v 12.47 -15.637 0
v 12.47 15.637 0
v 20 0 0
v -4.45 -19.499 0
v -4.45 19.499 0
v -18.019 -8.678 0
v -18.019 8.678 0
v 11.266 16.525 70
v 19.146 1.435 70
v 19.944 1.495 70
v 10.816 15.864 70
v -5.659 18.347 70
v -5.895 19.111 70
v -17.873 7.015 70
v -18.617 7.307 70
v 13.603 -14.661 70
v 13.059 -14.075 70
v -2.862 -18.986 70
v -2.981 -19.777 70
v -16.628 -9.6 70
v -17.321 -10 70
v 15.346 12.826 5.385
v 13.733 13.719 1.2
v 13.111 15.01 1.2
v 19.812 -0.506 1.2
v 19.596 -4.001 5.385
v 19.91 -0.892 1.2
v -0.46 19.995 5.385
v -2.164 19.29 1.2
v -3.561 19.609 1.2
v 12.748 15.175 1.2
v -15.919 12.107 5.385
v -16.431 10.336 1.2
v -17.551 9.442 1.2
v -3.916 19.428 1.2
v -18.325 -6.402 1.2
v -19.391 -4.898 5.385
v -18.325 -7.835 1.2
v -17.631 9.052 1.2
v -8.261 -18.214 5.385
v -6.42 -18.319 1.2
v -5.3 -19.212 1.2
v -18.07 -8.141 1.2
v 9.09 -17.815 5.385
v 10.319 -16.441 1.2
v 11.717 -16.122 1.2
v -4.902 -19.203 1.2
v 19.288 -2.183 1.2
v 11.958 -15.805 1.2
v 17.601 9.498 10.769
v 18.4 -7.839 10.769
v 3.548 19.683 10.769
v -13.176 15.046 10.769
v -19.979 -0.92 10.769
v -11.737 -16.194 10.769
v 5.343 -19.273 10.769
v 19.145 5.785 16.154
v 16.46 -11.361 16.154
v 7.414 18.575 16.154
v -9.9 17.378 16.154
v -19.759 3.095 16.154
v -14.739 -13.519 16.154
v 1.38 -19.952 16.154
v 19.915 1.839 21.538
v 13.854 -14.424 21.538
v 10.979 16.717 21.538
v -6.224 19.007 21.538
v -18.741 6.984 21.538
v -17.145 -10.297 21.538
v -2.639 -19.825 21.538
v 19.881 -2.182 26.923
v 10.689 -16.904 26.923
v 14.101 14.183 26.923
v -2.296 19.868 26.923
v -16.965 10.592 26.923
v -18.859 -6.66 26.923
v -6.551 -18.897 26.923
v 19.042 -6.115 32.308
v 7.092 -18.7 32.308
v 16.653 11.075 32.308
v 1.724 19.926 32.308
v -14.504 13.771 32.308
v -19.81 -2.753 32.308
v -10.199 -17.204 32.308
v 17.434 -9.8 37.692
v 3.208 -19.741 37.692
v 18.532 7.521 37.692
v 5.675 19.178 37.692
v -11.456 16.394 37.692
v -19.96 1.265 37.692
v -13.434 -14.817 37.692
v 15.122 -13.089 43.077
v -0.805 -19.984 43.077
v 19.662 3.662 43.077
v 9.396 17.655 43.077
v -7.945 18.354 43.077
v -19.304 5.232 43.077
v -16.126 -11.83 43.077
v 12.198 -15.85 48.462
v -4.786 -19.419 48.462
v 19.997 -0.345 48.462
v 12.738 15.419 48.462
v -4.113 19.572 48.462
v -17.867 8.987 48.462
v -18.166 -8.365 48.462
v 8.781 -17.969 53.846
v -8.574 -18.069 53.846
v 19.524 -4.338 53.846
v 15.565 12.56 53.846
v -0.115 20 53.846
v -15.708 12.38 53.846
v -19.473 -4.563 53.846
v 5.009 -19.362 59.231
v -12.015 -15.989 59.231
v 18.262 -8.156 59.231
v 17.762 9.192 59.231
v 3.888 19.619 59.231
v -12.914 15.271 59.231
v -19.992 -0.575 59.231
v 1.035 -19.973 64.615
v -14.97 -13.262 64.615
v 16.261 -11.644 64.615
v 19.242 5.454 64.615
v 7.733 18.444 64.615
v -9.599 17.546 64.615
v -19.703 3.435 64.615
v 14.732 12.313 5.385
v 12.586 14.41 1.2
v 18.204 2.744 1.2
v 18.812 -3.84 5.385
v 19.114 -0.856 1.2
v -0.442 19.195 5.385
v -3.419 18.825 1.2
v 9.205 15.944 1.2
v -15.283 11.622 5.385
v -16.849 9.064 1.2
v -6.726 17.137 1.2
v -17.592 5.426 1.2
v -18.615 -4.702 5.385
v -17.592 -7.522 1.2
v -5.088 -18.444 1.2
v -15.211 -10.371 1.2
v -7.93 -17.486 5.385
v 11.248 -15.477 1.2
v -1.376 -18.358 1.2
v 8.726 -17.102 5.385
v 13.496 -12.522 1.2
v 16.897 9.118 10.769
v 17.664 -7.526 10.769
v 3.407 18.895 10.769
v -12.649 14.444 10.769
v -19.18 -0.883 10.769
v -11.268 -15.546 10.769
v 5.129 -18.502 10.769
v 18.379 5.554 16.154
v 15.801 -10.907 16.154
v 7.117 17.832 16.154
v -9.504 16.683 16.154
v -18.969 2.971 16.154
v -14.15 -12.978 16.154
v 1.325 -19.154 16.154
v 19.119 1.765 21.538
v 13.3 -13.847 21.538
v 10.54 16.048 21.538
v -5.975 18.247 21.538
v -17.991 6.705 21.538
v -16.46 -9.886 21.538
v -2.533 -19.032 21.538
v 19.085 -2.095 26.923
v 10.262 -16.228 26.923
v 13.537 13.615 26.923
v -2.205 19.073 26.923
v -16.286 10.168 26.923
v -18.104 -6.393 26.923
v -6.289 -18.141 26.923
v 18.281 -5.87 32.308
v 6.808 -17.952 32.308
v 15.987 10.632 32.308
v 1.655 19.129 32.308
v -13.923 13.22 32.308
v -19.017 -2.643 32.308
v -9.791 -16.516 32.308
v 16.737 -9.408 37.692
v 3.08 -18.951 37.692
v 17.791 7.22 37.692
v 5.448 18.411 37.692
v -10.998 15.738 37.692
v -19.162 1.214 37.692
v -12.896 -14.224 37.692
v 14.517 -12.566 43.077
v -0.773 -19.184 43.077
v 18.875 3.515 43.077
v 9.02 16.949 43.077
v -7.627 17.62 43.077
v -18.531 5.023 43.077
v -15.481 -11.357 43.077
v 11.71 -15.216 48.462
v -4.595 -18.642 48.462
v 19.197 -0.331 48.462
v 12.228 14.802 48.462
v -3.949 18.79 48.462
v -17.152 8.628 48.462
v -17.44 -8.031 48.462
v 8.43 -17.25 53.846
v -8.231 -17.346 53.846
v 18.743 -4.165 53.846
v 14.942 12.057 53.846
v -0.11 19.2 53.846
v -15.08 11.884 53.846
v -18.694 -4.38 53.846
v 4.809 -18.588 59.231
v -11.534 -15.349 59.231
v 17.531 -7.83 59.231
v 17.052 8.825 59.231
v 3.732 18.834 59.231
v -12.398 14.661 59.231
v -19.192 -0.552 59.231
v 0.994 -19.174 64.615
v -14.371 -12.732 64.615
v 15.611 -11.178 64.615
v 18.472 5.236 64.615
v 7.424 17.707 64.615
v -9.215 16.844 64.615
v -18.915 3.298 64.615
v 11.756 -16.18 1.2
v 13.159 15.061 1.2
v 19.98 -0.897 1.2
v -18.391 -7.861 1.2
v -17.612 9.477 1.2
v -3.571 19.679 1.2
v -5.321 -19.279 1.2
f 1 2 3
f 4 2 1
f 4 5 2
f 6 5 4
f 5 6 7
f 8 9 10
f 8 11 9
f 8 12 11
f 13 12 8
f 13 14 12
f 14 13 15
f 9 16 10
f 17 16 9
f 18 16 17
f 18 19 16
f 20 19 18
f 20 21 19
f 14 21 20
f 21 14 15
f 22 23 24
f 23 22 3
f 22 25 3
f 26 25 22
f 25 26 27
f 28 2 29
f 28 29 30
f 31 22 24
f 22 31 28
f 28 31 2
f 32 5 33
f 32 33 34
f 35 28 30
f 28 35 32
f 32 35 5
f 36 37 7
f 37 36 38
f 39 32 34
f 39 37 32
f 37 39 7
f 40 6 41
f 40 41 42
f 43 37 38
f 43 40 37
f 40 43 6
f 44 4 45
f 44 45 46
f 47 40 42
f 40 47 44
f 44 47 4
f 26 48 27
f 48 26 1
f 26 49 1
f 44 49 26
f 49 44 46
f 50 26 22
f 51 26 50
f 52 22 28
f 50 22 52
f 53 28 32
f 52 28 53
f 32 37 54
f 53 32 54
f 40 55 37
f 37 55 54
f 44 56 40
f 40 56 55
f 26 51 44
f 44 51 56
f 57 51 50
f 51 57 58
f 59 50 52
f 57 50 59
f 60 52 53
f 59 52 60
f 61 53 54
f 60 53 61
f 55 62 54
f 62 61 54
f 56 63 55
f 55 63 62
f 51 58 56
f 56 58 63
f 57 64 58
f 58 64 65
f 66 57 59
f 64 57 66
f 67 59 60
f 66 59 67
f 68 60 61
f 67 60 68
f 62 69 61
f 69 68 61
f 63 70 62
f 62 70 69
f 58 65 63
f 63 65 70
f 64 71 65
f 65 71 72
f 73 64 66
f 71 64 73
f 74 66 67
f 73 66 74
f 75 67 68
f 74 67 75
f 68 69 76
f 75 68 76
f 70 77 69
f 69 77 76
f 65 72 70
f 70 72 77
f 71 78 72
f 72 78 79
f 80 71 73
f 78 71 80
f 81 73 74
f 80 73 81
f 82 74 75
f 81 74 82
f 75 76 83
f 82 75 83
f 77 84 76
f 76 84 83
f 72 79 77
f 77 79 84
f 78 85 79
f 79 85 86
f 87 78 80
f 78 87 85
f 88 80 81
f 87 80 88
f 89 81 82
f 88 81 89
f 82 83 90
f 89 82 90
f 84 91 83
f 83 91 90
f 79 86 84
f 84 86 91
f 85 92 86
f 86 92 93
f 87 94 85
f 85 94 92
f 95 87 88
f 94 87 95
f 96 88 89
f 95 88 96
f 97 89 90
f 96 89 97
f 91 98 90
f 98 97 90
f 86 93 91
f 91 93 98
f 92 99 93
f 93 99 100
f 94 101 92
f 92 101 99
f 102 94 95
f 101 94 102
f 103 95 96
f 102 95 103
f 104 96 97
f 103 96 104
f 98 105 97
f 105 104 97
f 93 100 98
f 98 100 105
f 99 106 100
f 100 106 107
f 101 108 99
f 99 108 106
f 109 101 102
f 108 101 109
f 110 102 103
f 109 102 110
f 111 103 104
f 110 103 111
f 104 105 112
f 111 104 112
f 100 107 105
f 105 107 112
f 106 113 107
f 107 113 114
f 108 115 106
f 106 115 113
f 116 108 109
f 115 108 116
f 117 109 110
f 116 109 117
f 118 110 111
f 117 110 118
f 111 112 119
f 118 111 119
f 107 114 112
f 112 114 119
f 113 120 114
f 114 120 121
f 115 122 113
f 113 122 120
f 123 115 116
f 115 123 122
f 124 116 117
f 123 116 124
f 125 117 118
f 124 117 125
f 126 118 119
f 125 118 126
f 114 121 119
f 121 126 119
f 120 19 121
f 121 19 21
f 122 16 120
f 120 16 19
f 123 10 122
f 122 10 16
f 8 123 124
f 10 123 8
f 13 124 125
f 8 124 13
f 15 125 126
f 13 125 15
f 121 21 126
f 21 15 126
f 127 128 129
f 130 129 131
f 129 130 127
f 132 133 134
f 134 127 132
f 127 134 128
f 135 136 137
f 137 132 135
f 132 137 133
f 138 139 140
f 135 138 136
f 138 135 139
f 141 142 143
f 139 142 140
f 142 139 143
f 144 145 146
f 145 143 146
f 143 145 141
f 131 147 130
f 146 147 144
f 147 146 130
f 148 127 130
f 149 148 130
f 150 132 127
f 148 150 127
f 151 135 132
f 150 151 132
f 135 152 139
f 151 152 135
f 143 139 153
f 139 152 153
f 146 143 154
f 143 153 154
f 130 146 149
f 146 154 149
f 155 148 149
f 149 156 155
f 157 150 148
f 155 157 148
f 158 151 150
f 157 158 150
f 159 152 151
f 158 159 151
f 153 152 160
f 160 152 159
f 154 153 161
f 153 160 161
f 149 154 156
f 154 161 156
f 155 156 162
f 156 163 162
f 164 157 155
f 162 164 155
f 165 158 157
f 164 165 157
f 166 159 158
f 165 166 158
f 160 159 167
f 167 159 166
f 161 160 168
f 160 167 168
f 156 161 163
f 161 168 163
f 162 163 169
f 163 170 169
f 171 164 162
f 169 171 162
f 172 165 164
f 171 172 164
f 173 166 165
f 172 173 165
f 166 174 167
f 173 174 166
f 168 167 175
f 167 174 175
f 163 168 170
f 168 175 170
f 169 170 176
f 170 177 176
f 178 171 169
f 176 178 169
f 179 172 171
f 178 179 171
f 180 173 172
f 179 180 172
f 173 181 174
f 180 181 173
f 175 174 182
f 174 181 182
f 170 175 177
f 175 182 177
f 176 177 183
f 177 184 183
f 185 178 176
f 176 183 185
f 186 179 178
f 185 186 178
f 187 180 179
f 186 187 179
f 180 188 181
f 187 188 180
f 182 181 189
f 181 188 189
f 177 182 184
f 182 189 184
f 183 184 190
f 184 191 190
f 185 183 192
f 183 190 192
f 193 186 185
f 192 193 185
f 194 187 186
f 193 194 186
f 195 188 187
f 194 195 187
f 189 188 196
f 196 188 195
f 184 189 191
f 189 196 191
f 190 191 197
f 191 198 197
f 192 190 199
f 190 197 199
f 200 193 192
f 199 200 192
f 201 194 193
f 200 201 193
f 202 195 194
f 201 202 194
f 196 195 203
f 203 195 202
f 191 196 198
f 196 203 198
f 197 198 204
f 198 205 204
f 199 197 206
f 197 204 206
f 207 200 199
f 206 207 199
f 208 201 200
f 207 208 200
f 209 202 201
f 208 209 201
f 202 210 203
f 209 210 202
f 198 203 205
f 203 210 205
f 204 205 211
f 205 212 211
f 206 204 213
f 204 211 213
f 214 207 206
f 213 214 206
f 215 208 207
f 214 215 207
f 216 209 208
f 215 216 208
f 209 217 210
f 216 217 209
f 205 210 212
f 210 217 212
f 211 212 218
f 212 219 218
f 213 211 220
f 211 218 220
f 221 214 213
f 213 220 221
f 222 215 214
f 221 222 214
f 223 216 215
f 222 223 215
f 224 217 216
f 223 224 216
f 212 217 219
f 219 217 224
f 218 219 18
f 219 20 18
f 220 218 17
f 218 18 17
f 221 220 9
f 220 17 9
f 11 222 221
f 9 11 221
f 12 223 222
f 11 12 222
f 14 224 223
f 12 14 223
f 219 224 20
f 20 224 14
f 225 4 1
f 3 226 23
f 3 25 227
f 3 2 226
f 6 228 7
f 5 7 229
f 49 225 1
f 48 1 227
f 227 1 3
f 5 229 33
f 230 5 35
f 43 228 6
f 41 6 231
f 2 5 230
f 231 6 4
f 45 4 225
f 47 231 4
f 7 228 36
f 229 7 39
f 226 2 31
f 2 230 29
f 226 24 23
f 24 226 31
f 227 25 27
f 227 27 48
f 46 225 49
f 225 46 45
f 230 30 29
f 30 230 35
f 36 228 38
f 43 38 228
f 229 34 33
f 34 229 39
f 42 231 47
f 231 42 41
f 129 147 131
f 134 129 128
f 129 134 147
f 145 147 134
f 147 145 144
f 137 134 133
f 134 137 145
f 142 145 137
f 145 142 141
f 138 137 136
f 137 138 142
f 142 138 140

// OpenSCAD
radius = 20;
thickness = 0.8;
height = 70;
height_floor = 1.2;
twist = 150;
corners = 7;

module bottom(rad) {
    circle(r=rad, $fn=corners);
}

module base_shape() {
    difference() {
        linear_extrude(height=height, twist=twist) bottom(rad=radius);
        linear_extrude(height=height, twist=twist) bottom(rad=radius-thickness);
    }
    linear_extrude(height=height_floor, twist=twist*height_floor/height) bottom(rad=radius);
}

base_shape();
